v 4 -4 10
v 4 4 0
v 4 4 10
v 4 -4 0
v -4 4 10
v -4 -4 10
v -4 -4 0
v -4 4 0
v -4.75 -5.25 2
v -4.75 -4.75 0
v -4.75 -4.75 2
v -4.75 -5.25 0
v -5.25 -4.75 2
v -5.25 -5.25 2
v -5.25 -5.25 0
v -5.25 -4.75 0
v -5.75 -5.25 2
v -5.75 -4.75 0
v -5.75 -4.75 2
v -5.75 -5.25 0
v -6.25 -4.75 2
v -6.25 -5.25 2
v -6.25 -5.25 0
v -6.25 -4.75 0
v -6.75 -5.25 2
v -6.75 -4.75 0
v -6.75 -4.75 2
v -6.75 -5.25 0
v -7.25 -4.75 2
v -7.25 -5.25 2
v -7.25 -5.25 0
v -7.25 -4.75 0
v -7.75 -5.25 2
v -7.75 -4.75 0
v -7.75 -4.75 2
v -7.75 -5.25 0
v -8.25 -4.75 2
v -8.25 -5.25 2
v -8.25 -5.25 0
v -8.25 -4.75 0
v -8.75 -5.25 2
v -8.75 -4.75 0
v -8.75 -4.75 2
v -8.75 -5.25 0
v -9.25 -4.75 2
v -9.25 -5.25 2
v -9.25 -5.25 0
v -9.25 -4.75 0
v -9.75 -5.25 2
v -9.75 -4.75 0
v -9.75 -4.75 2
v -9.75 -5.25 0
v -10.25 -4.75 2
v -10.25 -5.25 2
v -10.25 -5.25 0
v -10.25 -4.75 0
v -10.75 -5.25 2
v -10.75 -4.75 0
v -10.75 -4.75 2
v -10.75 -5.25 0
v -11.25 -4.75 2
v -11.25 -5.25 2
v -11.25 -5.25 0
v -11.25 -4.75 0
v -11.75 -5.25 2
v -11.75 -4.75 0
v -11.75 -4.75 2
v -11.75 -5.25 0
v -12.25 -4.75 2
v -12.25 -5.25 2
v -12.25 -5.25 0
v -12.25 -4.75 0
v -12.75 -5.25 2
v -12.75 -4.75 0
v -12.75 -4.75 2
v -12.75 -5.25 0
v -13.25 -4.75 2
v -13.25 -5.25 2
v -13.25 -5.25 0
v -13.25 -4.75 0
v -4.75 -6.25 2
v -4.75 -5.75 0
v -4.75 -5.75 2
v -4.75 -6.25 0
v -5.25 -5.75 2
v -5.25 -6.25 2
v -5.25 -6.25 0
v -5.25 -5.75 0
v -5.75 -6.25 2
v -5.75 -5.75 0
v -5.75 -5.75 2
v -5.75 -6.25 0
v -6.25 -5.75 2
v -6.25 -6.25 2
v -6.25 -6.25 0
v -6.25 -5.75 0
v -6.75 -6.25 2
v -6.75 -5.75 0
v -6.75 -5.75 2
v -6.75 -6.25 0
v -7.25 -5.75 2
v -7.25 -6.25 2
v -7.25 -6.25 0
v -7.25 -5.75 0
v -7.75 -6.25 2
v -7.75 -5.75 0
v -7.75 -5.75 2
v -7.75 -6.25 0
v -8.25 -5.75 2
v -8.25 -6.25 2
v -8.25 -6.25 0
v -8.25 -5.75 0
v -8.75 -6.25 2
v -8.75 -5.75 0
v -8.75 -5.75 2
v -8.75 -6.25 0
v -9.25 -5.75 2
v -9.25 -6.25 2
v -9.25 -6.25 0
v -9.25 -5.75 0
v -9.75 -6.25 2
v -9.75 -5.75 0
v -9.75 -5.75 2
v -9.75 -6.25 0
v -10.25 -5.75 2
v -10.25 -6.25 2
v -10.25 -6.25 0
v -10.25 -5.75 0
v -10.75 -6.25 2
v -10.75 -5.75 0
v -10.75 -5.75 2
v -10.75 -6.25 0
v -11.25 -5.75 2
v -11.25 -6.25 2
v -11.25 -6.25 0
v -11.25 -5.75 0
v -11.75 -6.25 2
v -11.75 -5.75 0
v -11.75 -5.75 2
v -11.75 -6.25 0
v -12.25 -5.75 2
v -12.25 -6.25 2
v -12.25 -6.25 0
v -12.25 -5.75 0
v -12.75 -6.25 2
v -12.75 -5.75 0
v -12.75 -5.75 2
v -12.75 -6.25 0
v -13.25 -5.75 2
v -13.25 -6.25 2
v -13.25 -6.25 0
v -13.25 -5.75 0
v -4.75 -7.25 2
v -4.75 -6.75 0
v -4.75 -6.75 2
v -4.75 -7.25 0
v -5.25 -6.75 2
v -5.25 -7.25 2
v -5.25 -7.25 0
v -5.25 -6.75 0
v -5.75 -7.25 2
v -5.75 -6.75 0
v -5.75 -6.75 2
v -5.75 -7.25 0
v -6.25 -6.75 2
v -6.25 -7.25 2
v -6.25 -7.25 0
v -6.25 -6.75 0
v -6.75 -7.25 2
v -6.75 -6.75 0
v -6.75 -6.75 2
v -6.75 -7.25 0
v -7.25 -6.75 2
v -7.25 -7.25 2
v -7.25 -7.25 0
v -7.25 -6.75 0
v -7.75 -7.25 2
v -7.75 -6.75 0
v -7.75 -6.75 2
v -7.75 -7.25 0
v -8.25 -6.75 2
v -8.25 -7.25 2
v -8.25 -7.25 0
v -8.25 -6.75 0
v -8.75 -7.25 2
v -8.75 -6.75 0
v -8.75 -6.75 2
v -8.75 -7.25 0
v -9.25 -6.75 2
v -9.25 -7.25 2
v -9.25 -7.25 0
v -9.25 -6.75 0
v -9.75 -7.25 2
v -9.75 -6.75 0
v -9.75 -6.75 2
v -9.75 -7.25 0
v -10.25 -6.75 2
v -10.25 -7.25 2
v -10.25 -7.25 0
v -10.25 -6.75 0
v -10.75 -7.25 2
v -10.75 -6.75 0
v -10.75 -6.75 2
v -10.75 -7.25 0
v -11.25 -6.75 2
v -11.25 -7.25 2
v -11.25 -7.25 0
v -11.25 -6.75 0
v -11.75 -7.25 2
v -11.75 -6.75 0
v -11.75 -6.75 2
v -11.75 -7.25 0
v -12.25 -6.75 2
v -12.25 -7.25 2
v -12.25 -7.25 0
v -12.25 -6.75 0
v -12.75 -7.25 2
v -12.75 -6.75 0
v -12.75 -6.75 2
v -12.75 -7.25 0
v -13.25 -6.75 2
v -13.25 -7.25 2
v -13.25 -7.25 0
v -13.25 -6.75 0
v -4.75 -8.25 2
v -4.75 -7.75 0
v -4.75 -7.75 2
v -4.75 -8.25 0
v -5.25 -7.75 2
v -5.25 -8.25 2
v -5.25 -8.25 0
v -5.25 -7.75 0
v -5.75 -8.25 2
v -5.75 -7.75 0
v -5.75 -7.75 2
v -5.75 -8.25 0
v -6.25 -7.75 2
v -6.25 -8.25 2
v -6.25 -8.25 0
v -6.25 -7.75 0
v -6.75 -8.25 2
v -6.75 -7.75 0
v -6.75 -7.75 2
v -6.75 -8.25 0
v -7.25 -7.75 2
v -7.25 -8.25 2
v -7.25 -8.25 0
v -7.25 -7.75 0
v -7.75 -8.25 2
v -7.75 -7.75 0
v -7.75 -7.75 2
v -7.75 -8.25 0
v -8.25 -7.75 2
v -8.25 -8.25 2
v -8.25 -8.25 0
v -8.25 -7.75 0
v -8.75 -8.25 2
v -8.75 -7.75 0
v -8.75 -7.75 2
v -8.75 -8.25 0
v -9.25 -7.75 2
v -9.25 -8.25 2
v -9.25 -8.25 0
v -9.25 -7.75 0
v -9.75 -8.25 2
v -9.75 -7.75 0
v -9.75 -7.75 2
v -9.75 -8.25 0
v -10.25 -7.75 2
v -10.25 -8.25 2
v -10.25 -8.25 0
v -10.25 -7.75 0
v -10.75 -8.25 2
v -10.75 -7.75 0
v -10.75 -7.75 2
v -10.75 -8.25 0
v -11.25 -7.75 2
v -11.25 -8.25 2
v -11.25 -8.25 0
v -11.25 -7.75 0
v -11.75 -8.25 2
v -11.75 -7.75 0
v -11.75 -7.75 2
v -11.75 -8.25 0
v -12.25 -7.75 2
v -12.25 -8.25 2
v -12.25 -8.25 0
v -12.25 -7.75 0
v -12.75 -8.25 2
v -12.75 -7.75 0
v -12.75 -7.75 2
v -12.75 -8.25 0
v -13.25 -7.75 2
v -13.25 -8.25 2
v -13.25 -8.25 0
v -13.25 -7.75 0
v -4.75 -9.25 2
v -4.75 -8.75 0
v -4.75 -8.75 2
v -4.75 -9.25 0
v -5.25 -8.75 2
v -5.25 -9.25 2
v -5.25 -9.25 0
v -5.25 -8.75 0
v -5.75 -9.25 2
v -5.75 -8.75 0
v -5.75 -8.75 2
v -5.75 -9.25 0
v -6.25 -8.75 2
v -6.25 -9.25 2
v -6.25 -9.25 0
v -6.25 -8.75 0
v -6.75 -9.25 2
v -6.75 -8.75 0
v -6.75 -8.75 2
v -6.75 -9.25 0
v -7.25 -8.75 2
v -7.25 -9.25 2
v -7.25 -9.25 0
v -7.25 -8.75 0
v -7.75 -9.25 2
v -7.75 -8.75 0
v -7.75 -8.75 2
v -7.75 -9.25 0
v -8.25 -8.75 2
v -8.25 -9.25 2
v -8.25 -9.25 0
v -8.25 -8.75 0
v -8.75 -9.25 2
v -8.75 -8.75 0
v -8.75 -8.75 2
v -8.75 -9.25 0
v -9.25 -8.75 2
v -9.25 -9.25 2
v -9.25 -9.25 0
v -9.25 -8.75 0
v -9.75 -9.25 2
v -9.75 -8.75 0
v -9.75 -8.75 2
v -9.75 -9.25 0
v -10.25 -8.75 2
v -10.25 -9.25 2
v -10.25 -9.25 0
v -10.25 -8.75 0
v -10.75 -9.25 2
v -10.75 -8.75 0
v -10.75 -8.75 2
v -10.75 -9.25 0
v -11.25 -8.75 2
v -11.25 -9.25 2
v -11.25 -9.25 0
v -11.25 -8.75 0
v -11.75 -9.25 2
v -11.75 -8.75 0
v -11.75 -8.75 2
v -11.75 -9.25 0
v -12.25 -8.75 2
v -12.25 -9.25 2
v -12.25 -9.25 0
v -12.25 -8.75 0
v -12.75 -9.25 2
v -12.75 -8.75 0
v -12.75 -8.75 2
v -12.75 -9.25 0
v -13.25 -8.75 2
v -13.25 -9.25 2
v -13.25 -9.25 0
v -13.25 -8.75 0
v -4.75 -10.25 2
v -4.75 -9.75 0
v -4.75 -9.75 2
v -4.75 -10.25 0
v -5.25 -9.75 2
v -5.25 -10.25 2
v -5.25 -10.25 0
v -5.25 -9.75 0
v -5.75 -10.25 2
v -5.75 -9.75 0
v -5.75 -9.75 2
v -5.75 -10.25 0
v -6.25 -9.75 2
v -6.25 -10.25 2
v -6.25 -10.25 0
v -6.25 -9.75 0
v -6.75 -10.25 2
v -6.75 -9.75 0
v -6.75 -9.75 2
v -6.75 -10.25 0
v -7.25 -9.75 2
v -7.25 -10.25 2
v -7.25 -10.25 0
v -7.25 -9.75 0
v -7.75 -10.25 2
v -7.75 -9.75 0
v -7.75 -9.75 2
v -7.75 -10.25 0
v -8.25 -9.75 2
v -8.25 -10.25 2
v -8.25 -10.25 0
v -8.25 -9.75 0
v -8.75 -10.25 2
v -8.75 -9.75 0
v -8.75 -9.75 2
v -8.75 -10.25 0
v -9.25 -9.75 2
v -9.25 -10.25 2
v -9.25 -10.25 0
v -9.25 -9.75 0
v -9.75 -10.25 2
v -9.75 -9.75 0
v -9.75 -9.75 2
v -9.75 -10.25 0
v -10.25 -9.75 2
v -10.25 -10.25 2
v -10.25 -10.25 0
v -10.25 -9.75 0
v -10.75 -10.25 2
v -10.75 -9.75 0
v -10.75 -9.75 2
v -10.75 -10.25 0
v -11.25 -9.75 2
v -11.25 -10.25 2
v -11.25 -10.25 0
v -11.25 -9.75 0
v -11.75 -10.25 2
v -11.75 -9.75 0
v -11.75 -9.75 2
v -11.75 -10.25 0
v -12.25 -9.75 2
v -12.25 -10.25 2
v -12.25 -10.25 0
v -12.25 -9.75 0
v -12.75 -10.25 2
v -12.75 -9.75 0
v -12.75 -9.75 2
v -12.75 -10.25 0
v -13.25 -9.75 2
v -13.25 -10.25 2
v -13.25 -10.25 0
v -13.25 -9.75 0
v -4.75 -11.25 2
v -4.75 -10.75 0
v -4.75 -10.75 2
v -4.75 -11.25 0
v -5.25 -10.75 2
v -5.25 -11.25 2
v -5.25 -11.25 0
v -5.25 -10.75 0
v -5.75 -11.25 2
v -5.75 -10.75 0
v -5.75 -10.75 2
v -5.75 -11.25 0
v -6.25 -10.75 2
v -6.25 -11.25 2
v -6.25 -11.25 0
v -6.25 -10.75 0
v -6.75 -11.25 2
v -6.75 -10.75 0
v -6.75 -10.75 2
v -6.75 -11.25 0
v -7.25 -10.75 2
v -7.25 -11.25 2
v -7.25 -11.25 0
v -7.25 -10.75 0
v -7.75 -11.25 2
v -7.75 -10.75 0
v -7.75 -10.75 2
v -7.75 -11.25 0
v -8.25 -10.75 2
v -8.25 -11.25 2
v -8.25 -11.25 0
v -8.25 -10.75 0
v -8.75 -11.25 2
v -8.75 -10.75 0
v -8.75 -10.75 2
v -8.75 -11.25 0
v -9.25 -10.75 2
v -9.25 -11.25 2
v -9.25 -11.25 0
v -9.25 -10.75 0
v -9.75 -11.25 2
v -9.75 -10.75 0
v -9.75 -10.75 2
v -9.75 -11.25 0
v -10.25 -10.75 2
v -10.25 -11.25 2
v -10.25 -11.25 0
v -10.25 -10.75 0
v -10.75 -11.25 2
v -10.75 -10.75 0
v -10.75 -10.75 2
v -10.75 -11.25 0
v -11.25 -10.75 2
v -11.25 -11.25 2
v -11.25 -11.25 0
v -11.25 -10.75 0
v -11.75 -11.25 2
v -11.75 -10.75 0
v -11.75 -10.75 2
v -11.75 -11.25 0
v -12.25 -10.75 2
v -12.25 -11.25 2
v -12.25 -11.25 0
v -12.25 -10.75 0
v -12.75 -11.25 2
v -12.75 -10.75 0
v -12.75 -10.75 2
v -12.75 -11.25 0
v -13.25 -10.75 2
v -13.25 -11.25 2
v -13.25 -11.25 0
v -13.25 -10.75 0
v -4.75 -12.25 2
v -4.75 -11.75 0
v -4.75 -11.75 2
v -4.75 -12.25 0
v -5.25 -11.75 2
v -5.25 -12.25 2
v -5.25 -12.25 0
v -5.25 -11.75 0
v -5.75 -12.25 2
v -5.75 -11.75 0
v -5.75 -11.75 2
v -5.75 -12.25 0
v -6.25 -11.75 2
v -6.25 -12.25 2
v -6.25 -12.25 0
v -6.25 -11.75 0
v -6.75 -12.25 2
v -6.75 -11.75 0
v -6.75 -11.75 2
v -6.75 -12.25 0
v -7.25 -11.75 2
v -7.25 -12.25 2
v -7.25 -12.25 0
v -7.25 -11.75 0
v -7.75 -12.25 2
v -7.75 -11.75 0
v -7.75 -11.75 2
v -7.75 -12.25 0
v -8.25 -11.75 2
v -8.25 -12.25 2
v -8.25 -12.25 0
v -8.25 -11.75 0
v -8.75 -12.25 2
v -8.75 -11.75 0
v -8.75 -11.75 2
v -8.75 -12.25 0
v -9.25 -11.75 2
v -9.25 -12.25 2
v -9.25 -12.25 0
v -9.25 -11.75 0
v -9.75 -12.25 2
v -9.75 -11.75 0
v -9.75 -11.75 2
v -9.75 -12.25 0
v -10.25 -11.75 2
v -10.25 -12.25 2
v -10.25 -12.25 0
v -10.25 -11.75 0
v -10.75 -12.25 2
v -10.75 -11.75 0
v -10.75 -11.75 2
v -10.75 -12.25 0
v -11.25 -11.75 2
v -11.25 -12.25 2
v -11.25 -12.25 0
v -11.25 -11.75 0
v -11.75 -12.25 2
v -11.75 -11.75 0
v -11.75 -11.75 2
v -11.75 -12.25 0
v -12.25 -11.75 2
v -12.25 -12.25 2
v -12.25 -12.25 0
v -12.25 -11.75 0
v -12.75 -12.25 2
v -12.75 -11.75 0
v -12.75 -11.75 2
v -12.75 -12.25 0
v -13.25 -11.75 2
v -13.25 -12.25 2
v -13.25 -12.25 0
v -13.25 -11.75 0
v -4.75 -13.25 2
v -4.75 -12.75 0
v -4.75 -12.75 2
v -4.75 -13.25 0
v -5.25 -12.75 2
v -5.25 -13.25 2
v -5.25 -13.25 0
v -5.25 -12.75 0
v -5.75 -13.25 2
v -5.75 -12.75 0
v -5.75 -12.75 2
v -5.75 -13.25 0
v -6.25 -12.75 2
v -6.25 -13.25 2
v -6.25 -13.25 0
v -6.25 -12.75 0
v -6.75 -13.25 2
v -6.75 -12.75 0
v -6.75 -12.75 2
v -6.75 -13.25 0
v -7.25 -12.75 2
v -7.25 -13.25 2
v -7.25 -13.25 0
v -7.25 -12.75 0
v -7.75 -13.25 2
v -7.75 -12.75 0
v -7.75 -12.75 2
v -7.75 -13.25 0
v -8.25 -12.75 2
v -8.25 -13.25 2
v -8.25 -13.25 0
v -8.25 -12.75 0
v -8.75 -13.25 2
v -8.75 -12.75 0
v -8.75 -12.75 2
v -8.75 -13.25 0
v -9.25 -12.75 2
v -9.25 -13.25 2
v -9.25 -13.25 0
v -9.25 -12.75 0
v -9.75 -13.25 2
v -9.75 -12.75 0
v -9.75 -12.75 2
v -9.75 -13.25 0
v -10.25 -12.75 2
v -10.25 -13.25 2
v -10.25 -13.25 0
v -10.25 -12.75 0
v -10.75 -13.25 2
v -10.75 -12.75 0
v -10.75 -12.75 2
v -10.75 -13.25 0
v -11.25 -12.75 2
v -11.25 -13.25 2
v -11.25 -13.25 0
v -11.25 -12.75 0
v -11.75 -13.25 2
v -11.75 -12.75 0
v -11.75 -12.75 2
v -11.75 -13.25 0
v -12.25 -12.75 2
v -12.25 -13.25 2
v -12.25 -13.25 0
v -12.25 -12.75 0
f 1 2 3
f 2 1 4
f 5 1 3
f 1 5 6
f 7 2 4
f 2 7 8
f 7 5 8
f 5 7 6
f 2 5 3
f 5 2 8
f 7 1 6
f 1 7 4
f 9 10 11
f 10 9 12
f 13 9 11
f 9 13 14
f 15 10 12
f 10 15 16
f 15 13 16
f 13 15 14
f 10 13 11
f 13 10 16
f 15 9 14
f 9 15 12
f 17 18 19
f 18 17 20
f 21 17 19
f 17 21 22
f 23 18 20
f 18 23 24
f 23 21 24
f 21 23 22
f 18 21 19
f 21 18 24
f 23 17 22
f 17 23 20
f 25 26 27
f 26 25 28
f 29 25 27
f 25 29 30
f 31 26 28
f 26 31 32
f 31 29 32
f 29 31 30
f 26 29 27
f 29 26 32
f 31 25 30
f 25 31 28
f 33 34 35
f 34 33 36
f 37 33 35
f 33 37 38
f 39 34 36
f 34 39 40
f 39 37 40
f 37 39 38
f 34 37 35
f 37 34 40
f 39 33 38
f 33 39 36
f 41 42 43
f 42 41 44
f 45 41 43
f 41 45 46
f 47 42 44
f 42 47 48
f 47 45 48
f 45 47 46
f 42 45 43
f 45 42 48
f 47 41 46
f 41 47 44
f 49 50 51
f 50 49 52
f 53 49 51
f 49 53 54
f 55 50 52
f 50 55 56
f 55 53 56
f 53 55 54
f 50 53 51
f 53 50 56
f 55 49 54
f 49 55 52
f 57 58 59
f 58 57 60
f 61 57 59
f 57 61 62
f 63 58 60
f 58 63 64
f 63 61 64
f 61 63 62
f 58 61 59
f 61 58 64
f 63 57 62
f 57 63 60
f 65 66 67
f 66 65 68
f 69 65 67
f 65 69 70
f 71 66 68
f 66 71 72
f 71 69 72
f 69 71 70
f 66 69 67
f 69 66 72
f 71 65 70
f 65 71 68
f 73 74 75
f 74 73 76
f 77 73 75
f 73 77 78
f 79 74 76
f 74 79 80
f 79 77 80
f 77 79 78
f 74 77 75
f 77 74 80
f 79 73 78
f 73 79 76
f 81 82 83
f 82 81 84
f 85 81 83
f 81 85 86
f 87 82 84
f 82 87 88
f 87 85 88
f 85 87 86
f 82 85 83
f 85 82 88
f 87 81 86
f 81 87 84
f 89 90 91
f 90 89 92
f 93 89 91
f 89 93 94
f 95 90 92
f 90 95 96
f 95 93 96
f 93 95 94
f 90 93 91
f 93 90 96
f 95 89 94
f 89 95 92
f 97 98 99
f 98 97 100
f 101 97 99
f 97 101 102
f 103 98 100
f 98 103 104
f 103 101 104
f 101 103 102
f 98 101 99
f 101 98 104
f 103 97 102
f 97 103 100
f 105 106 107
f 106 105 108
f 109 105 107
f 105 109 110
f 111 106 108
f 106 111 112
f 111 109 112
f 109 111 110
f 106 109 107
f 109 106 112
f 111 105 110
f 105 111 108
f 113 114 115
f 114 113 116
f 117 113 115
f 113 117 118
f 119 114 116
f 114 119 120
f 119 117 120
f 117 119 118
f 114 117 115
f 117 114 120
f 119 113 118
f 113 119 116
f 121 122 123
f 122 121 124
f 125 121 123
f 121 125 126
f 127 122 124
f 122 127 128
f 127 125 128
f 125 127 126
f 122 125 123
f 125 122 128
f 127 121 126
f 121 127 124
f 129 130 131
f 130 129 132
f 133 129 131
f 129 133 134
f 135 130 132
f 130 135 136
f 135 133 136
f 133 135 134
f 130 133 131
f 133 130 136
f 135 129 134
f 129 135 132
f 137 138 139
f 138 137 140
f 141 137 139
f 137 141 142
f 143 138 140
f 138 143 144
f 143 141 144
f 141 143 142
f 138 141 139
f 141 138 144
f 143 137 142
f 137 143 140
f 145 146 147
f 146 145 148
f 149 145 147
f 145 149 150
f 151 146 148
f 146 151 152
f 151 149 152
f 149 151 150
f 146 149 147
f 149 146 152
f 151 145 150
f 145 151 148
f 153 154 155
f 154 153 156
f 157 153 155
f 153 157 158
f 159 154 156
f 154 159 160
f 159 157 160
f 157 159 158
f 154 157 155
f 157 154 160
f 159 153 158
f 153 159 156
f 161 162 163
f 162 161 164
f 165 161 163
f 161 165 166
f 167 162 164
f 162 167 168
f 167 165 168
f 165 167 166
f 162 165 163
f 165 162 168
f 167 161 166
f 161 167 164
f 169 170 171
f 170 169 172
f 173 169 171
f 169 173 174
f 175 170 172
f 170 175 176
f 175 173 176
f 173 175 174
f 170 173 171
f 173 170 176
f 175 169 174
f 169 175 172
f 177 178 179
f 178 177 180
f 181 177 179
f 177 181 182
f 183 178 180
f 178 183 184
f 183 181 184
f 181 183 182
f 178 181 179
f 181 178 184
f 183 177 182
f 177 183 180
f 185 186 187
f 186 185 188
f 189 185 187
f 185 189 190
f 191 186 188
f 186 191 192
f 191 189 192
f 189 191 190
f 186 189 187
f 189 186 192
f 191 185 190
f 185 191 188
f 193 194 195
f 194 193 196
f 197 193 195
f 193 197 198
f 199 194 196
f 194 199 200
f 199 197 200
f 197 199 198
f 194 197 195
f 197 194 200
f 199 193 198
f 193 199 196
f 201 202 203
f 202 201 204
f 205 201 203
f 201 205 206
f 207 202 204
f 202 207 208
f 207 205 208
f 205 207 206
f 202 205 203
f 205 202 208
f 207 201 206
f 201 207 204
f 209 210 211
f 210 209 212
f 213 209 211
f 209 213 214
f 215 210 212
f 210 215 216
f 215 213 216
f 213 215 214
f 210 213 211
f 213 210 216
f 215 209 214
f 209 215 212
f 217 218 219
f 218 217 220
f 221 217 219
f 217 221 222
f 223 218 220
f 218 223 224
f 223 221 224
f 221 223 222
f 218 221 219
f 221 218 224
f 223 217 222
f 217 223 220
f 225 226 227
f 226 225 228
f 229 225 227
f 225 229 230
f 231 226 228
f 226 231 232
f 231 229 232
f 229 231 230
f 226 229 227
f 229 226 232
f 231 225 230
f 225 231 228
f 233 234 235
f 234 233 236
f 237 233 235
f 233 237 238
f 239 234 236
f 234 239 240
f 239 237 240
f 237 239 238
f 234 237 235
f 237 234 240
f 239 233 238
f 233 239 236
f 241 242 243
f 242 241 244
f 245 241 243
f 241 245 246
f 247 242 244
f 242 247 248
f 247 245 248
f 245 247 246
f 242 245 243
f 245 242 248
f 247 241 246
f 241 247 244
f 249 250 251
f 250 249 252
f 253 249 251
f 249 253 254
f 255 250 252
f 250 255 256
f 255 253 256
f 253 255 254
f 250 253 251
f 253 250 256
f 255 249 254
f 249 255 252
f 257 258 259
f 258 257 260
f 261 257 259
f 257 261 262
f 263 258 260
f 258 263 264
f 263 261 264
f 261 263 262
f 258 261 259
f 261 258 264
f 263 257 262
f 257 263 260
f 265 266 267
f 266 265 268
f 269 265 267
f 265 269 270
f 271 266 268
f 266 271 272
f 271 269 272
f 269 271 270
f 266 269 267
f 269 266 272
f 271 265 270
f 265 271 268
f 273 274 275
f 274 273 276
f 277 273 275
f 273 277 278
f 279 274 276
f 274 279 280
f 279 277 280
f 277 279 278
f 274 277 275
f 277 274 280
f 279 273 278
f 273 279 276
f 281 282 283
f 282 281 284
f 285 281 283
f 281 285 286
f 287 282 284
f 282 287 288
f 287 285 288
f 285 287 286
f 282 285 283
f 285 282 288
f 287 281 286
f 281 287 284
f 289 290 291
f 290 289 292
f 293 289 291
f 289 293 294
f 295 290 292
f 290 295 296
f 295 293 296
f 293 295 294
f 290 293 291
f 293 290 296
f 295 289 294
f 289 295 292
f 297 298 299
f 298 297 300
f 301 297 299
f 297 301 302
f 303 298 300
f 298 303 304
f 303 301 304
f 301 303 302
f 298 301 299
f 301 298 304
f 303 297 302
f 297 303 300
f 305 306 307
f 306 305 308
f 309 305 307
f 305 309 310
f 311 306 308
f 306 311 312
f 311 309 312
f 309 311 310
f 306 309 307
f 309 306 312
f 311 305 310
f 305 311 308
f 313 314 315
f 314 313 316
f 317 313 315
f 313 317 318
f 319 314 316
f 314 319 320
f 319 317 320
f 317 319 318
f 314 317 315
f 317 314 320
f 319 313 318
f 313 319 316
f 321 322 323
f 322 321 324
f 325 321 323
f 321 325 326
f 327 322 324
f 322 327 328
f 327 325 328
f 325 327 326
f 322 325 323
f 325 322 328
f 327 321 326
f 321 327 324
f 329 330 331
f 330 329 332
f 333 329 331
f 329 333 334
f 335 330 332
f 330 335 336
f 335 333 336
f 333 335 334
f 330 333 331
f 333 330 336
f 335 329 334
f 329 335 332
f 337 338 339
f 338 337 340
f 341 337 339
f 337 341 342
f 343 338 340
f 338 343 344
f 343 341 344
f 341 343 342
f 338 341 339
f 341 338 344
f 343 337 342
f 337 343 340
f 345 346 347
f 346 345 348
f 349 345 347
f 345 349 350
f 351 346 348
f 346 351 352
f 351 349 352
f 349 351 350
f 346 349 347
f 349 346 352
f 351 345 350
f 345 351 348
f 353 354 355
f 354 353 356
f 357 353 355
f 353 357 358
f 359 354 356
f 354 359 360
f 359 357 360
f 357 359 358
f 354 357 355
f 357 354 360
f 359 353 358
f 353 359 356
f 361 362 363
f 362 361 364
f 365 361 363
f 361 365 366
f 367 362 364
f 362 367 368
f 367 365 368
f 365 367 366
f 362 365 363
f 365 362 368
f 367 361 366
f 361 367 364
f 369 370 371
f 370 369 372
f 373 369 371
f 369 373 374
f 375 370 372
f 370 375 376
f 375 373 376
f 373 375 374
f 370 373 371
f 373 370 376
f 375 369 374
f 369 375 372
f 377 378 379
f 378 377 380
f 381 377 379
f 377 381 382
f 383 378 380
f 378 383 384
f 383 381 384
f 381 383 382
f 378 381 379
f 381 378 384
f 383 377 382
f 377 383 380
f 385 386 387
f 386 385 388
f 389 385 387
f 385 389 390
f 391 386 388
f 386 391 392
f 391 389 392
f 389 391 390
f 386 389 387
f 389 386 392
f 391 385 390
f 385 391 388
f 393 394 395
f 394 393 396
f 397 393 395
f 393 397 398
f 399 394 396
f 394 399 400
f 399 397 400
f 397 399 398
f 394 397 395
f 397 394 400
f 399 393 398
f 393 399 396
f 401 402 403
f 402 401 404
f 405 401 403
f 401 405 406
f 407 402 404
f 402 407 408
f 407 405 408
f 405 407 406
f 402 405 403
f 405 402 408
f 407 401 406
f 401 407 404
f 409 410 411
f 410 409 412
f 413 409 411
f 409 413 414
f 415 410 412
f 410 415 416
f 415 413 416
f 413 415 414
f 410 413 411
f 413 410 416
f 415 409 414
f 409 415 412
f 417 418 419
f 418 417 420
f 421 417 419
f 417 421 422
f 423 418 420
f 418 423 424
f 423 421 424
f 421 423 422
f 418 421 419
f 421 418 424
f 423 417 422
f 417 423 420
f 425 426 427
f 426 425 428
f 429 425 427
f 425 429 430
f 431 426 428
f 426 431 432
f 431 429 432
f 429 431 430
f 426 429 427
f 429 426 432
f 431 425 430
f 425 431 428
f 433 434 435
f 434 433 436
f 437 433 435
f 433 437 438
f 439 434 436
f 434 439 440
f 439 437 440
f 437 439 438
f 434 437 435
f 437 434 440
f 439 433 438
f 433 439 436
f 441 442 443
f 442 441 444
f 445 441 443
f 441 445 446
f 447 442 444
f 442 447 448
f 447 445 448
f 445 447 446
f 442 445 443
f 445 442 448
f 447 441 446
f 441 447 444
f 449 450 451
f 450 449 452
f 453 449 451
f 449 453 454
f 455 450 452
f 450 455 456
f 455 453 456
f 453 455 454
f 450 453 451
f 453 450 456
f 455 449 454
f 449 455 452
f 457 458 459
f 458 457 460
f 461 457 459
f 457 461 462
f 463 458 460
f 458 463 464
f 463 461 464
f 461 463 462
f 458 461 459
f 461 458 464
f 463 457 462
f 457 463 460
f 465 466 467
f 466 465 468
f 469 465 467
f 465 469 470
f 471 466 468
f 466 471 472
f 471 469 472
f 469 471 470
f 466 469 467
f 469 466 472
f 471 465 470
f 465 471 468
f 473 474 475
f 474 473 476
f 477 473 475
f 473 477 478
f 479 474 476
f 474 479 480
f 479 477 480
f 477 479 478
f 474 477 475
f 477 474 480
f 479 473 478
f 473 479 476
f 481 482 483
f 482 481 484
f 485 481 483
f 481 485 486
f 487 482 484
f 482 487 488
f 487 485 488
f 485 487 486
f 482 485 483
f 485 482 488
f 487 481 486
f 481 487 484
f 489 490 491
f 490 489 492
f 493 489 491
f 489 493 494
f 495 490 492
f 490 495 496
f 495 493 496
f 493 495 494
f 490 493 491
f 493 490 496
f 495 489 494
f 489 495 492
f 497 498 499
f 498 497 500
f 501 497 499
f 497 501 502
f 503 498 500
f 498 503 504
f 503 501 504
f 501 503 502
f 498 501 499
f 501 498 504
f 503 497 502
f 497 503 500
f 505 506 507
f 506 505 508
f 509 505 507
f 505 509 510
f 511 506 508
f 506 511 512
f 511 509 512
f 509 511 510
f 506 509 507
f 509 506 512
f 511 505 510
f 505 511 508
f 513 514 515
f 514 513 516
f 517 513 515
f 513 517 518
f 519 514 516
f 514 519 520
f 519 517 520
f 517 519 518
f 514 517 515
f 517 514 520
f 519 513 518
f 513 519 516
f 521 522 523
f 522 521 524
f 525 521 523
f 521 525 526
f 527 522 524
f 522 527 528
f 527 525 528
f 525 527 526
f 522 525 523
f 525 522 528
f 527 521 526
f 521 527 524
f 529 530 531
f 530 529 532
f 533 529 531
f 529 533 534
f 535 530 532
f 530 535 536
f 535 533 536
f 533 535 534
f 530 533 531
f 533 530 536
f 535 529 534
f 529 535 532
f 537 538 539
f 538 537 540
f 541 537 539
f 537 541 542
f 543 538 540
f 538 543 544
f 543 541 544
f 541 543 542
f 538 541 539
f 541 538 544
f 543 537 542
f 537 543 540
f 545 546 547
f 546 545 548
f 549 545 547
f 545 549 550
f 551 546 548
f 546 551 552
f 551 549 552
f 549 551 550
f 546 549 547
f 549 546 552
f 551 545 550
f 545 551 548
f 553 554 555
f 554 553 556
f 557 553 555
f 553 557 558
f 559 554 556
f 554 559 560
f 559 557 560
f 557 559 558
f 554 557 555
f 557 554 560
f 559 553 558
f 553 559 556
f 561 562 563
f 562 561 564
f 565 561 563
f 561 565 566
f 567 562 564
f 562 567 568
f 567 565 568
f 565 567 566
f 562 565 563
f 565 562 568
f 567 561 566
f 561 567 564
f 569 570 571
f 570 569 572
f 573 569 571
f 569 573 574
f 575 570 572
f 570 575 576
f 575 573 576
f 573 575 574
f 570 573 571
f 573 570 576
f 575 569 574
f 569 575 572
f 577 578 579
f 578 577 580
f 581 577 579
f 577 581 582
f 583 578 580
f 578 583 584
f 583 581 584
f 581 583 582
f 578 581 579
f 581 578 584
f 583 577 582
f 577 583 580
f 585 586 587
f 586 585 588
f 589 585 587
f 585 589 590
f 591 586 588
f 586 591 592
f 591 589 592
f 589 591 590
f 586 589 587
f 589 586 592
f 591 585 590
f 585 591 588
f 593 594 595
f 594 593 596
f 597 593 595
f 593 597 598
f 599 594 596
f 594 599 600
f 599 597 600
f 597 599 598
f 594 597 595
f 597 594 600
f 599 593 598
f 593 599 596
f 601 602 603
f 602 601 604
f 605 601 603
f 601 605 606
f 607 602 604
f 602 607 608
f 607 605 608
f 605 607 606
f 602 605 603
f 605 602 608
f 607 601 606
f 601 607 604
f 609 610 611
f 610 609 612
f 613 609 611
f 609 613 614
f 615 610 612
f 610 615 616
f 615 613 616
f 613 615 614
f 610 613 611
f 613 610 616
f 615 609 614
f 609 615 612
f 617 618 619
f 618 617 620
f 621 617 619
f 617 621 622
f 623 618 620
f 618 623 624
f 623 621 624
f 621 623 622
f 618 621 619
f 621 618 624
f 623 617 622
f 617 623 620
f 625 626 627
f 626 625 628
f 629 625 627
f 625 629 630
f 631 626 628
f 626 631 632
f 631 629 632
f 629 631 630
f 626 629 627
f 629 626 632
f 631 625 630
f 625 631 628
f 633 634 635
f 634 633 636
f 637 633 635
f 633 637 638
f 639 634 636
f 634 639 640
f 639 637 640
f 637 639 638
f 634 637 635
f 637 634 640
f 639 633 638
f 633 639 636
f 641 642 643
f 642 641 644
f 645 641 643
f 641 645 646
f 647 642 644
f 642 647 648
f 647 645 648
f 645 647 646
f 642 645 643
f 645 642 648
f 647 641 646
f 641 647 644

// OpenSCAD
translate([0, 0, 5]) color([0,1,0,0.9]) cube([8, 8, 10], center=true);
translate([-5, -5, 1]) color([1,0,0]) cube([0.5, 0.5, 2], center=true);
translate([-6, -5, 1]) color([1,0,0]) cube([0.5, 0.5, 2], center=true);
translate([-7, -5, 1]) color([1,0,0]) cube([0.5, 0.5, 2], center=true);
translate([-8, -5, 1]) color([1,0,0]) cube([0.5, 0.5, 2], center=true);
translate([-9, -5, 1]) color([1,0,0]) cube([0.5, 0.5, 2], center=true);
translate([-10, -5, 1]) color([1,0,0]) cube([0.5, 0.5, 2], center=true);
translate([-11, -5, 1]) color([1,0,0]) cube([0.5, 0.5, 2], center=true);
translate([-12, -5, 1]) color([1,0,0]) cube([0.5, 0.5, 2], center=true);
translate([-13, -5, 1]) color([1,0,0]) cube([0.5, 0.5, 2], center=true);
translate([-5, -6, 1]) color([1,0,0]) cube([0.5, 0.5, 2], center=true);
translate([-6, -6, 1]) color([1,0,0]) cube([0.5, 0.5, 2], center=true);
translate([-7, -6, 1]) color([1,0,0]) cube([0.5, 0.5, 2], center=true);
translate([-8, -6, 1]) color([1,0,0]) cube([0.5, 0.5, 2], center=true);
translate([-9, -6, 1]) color([1,0,0]) cube([0.5, 0.5, 2], center=true);
translate([-10, -6, 1]) color([1,0,0]) cube([0.5, 0.5, 2], center=true);
translate([-11, -6, 1]) color([1,0,0]) cube([0.5, 0.5, 2], center=true);
translate([-12, -6, 1]) color([1,0,0]) cube([0.5, 0.5, 2], center=true);
translate([-13, -6, 1]) color([1,0,0]) cube([0.5, 0.5, 2], center=true);
translate([-5, -7, 1]) color([1,0,0]) cube([0.5, 0.5, 2], center=true);
translate([-6, -7, 1]) color([1,0,0]) cube([0.5, 0.5, 2], center=true);
translate([-7, -7, 1]) color([1,0,0]) cube([0.5, 0.5, 2], center=true);
translate([-8, -7, 1]) color([1,0,0]) cube([0.5, 0.5, 2], center=true);
translate([-9, -7, 1]) color([1,0,0]) cube([0.5, 0.5, 2], center=true);
translate([-10, -7, 1]) color([1,0,0]) cube([0.5, 0.5, 2], center=true);
translate([-11, -7, 1]) color([1,0,0]) cube([0.5, 0.5, 2], center=true);
translate([-12, -7, 1]) color([1,0,0]) cube([0.5, 0.5, 2], center=true);
translate([-13, -7, 1]) color([1,0,0]) cube([0.5, 0.5, 2], center=true);
translate([-5, -8, 1]) color([1,0,0]) cube([0.5, 0.5, 2], center=true);
translate([-6, -8, 1]) color([1,0,0]) cube([0.5, 0.5, 2], center=true);
translate([-7, -8, 1]) color([1,0,0]) cube([0.5, 0.5, 2], center=true);
translate([-8, -8, 1]) color([1,0,0]) cube([0.5, 0.5, 2], center=true);
translate([-9, -8, 1]) color([1,0,0]) cube([0.5, 0.5, 2], center=true);
translate([-10, -8, 1]) color([1,0,0]) cube([0.5, 0.5, 2], center=true);
translate([-11, -8, 1]) color([1,0,0]) cube([0.5, 0.5, 2], center=true);
translate([-12, -8, 1]) color([1,0,0]) cube([0.5, 0.5, 2], center=true);
translate([-13, -8, 1]) color([1,0,0]) cube([0.5, 0.5, 2], center=true);
translate([-5, -9, 1]) color([1,0,0]) cube([0.5, 0.5, 2], center=true);
translate([-6, -9, 1]) color([1,0,0]) cube([0.5, 0.5, 2], center=true);
translate([-7, -9, 1]) color([1,0,0]) cube([0.5, 0.5, 2], center=true);
translate([-8, -9, 1]) color([1,0,0]) cube([0.5, 0.5, 2], center=true);
translate([-9, -9, 1]) color([1,0,0]) cube([0.5, 0.5, 2], center=true);
translate([-10, -9, 1]) color([1,0,0]) cube([0.5, 0.5, 2], center=true);
translate([-11, -9, 1]) color([1,0,0]) cube([0.5, 0.5, 2], center=true);
translate([-12, -9, 1]) color([1,0,0]) cube([0.5, 0.5, 2], center=true);
translate([-13, -9, 1]) color([1,0,0]) cube([0.5, 0.5, 2], center=true);
translate([-5, -10, 1]) color([1,0,0]) cube([0.5, 0.5, 2], center=true);
translate([-6, -10, 1]) color([1,0,0]) cube([0.5, 0.5, 2], center=true);
translate([-7, -10, 1]) color([1,0,0]) cube([0.5, 0.5, 2], center=true);
translate([-8, -10, 1]) color([1,0,0]) cube([0.5, 0.5, 2], center=true);
translate([-9, -10, 1]) color([1,0,0]) cube([0.5, 0.5, 2], center=true);
translate([-10, -10, 1]) color([1,0,0]) cube([0.5, 0.5, 2], center=true);
translate([-11, -10, 1]) color([1,0,0]) cube([0.5, 0.5, 2], center=true);
translate([-12, -10, 1]) color([1,0,0]) cube([0.5, 0.5, 2], center=true);
translate([-13, -10, 1]) color([1,0,0]) cube([0.5, 0.5, 2], center=true);
translate([-5, -11, 1]) color([1,0,0]) cube([0.5, 0.5, 2], center=true);
translate([-6, -11, 1]) color([1,0,0]) cube([0.5, 0.5, 2], center=true);
translate([-7, -11, 1]) color([1,0,0]) cube([0.5, 0.5, 2], center=true);
translate([-8, -11, 1]) color([1,0,0]) cube([0.5, 0.5, 2], center=true);
translate([-9, -11, 1]) color([1,0,0]) cube([0.5, 0.5, 2], center=true);
translate([-10, -11, 1]) color([1,0,0]) cube([0.5, 0.5, 2], center=true);
translate([-11, -11, 1]) color([1,0,0]) cube([0.5, 0.5, 2], center=true);
translate([-12, -11, 1]) color([1,0,0]) cube([0.5, 0.5, 2], center=true);
translate([-13, -11, 1]) color([1,0,0]) cube([0.5, 0.5, 2], center=true);
translate([-5, -12, 1]) color([1,0,0]) cube([0.5, 0.5, 2], center=true);
translate([-6, -12, 1]) color([1,0,0]) cube([0.5, 0.5, 2], center=true);
translate([-7, -12, 1]) color([1,0,0]) cube([0.5, 0.5, 2], center=true);
translate([-8, -12, 1]) color([1,0,0]) cube([0.5, 0.5, 2], center=true);
translate([-9, -12, 1]) color([1,0,0]) cube([0.5, 0.5, 2], center=true);
translate([-10, -12, 1]) color([1,0,0]) cube([0.5, 0.5, 2], center=true);
translate([-11, -12, 1]) color([1,0,0]) cube([0.5, 0.5, 2], center=true);
translate([-12, -12, 1]) color([1,0,0]) cube([0.5, 0.5, 2], center=true);
translate([-13, -12, 1]) color([1,0,0]) cube([0.5, 0.5, 2], center=true);
translate([-5, -13, 1]) color([1,0,0]) cube([0.5, 0.5, 2], center=true);
translate([-6, -13, 1]) color([1,0,0]) cube([0.5, 0.5, 2], center=true);
translate([-7, -13, 1]) color([1,0,0]) cube([0.5, 0.5, 2], center=true);
translate([-8, -13, 1]) color([1,0,0]) cube([0.5, 0.5, 2], center=true);
translate([-9, -13, 1]) color([1,0,0]) cube([0.5, 0.5, 2], center=true);
translate([-10, -13, 1]) color([1,0,0]) cube([0.5, 0.5, 2], center=true);
translate([-11, -13, 1]) color([1,0,0]) cube([0.5, 0.5, 2], center=true);
translate([-12, -13, 1]) color([1,0,0]) cube([0.5, 0.5, 2], center=true);
